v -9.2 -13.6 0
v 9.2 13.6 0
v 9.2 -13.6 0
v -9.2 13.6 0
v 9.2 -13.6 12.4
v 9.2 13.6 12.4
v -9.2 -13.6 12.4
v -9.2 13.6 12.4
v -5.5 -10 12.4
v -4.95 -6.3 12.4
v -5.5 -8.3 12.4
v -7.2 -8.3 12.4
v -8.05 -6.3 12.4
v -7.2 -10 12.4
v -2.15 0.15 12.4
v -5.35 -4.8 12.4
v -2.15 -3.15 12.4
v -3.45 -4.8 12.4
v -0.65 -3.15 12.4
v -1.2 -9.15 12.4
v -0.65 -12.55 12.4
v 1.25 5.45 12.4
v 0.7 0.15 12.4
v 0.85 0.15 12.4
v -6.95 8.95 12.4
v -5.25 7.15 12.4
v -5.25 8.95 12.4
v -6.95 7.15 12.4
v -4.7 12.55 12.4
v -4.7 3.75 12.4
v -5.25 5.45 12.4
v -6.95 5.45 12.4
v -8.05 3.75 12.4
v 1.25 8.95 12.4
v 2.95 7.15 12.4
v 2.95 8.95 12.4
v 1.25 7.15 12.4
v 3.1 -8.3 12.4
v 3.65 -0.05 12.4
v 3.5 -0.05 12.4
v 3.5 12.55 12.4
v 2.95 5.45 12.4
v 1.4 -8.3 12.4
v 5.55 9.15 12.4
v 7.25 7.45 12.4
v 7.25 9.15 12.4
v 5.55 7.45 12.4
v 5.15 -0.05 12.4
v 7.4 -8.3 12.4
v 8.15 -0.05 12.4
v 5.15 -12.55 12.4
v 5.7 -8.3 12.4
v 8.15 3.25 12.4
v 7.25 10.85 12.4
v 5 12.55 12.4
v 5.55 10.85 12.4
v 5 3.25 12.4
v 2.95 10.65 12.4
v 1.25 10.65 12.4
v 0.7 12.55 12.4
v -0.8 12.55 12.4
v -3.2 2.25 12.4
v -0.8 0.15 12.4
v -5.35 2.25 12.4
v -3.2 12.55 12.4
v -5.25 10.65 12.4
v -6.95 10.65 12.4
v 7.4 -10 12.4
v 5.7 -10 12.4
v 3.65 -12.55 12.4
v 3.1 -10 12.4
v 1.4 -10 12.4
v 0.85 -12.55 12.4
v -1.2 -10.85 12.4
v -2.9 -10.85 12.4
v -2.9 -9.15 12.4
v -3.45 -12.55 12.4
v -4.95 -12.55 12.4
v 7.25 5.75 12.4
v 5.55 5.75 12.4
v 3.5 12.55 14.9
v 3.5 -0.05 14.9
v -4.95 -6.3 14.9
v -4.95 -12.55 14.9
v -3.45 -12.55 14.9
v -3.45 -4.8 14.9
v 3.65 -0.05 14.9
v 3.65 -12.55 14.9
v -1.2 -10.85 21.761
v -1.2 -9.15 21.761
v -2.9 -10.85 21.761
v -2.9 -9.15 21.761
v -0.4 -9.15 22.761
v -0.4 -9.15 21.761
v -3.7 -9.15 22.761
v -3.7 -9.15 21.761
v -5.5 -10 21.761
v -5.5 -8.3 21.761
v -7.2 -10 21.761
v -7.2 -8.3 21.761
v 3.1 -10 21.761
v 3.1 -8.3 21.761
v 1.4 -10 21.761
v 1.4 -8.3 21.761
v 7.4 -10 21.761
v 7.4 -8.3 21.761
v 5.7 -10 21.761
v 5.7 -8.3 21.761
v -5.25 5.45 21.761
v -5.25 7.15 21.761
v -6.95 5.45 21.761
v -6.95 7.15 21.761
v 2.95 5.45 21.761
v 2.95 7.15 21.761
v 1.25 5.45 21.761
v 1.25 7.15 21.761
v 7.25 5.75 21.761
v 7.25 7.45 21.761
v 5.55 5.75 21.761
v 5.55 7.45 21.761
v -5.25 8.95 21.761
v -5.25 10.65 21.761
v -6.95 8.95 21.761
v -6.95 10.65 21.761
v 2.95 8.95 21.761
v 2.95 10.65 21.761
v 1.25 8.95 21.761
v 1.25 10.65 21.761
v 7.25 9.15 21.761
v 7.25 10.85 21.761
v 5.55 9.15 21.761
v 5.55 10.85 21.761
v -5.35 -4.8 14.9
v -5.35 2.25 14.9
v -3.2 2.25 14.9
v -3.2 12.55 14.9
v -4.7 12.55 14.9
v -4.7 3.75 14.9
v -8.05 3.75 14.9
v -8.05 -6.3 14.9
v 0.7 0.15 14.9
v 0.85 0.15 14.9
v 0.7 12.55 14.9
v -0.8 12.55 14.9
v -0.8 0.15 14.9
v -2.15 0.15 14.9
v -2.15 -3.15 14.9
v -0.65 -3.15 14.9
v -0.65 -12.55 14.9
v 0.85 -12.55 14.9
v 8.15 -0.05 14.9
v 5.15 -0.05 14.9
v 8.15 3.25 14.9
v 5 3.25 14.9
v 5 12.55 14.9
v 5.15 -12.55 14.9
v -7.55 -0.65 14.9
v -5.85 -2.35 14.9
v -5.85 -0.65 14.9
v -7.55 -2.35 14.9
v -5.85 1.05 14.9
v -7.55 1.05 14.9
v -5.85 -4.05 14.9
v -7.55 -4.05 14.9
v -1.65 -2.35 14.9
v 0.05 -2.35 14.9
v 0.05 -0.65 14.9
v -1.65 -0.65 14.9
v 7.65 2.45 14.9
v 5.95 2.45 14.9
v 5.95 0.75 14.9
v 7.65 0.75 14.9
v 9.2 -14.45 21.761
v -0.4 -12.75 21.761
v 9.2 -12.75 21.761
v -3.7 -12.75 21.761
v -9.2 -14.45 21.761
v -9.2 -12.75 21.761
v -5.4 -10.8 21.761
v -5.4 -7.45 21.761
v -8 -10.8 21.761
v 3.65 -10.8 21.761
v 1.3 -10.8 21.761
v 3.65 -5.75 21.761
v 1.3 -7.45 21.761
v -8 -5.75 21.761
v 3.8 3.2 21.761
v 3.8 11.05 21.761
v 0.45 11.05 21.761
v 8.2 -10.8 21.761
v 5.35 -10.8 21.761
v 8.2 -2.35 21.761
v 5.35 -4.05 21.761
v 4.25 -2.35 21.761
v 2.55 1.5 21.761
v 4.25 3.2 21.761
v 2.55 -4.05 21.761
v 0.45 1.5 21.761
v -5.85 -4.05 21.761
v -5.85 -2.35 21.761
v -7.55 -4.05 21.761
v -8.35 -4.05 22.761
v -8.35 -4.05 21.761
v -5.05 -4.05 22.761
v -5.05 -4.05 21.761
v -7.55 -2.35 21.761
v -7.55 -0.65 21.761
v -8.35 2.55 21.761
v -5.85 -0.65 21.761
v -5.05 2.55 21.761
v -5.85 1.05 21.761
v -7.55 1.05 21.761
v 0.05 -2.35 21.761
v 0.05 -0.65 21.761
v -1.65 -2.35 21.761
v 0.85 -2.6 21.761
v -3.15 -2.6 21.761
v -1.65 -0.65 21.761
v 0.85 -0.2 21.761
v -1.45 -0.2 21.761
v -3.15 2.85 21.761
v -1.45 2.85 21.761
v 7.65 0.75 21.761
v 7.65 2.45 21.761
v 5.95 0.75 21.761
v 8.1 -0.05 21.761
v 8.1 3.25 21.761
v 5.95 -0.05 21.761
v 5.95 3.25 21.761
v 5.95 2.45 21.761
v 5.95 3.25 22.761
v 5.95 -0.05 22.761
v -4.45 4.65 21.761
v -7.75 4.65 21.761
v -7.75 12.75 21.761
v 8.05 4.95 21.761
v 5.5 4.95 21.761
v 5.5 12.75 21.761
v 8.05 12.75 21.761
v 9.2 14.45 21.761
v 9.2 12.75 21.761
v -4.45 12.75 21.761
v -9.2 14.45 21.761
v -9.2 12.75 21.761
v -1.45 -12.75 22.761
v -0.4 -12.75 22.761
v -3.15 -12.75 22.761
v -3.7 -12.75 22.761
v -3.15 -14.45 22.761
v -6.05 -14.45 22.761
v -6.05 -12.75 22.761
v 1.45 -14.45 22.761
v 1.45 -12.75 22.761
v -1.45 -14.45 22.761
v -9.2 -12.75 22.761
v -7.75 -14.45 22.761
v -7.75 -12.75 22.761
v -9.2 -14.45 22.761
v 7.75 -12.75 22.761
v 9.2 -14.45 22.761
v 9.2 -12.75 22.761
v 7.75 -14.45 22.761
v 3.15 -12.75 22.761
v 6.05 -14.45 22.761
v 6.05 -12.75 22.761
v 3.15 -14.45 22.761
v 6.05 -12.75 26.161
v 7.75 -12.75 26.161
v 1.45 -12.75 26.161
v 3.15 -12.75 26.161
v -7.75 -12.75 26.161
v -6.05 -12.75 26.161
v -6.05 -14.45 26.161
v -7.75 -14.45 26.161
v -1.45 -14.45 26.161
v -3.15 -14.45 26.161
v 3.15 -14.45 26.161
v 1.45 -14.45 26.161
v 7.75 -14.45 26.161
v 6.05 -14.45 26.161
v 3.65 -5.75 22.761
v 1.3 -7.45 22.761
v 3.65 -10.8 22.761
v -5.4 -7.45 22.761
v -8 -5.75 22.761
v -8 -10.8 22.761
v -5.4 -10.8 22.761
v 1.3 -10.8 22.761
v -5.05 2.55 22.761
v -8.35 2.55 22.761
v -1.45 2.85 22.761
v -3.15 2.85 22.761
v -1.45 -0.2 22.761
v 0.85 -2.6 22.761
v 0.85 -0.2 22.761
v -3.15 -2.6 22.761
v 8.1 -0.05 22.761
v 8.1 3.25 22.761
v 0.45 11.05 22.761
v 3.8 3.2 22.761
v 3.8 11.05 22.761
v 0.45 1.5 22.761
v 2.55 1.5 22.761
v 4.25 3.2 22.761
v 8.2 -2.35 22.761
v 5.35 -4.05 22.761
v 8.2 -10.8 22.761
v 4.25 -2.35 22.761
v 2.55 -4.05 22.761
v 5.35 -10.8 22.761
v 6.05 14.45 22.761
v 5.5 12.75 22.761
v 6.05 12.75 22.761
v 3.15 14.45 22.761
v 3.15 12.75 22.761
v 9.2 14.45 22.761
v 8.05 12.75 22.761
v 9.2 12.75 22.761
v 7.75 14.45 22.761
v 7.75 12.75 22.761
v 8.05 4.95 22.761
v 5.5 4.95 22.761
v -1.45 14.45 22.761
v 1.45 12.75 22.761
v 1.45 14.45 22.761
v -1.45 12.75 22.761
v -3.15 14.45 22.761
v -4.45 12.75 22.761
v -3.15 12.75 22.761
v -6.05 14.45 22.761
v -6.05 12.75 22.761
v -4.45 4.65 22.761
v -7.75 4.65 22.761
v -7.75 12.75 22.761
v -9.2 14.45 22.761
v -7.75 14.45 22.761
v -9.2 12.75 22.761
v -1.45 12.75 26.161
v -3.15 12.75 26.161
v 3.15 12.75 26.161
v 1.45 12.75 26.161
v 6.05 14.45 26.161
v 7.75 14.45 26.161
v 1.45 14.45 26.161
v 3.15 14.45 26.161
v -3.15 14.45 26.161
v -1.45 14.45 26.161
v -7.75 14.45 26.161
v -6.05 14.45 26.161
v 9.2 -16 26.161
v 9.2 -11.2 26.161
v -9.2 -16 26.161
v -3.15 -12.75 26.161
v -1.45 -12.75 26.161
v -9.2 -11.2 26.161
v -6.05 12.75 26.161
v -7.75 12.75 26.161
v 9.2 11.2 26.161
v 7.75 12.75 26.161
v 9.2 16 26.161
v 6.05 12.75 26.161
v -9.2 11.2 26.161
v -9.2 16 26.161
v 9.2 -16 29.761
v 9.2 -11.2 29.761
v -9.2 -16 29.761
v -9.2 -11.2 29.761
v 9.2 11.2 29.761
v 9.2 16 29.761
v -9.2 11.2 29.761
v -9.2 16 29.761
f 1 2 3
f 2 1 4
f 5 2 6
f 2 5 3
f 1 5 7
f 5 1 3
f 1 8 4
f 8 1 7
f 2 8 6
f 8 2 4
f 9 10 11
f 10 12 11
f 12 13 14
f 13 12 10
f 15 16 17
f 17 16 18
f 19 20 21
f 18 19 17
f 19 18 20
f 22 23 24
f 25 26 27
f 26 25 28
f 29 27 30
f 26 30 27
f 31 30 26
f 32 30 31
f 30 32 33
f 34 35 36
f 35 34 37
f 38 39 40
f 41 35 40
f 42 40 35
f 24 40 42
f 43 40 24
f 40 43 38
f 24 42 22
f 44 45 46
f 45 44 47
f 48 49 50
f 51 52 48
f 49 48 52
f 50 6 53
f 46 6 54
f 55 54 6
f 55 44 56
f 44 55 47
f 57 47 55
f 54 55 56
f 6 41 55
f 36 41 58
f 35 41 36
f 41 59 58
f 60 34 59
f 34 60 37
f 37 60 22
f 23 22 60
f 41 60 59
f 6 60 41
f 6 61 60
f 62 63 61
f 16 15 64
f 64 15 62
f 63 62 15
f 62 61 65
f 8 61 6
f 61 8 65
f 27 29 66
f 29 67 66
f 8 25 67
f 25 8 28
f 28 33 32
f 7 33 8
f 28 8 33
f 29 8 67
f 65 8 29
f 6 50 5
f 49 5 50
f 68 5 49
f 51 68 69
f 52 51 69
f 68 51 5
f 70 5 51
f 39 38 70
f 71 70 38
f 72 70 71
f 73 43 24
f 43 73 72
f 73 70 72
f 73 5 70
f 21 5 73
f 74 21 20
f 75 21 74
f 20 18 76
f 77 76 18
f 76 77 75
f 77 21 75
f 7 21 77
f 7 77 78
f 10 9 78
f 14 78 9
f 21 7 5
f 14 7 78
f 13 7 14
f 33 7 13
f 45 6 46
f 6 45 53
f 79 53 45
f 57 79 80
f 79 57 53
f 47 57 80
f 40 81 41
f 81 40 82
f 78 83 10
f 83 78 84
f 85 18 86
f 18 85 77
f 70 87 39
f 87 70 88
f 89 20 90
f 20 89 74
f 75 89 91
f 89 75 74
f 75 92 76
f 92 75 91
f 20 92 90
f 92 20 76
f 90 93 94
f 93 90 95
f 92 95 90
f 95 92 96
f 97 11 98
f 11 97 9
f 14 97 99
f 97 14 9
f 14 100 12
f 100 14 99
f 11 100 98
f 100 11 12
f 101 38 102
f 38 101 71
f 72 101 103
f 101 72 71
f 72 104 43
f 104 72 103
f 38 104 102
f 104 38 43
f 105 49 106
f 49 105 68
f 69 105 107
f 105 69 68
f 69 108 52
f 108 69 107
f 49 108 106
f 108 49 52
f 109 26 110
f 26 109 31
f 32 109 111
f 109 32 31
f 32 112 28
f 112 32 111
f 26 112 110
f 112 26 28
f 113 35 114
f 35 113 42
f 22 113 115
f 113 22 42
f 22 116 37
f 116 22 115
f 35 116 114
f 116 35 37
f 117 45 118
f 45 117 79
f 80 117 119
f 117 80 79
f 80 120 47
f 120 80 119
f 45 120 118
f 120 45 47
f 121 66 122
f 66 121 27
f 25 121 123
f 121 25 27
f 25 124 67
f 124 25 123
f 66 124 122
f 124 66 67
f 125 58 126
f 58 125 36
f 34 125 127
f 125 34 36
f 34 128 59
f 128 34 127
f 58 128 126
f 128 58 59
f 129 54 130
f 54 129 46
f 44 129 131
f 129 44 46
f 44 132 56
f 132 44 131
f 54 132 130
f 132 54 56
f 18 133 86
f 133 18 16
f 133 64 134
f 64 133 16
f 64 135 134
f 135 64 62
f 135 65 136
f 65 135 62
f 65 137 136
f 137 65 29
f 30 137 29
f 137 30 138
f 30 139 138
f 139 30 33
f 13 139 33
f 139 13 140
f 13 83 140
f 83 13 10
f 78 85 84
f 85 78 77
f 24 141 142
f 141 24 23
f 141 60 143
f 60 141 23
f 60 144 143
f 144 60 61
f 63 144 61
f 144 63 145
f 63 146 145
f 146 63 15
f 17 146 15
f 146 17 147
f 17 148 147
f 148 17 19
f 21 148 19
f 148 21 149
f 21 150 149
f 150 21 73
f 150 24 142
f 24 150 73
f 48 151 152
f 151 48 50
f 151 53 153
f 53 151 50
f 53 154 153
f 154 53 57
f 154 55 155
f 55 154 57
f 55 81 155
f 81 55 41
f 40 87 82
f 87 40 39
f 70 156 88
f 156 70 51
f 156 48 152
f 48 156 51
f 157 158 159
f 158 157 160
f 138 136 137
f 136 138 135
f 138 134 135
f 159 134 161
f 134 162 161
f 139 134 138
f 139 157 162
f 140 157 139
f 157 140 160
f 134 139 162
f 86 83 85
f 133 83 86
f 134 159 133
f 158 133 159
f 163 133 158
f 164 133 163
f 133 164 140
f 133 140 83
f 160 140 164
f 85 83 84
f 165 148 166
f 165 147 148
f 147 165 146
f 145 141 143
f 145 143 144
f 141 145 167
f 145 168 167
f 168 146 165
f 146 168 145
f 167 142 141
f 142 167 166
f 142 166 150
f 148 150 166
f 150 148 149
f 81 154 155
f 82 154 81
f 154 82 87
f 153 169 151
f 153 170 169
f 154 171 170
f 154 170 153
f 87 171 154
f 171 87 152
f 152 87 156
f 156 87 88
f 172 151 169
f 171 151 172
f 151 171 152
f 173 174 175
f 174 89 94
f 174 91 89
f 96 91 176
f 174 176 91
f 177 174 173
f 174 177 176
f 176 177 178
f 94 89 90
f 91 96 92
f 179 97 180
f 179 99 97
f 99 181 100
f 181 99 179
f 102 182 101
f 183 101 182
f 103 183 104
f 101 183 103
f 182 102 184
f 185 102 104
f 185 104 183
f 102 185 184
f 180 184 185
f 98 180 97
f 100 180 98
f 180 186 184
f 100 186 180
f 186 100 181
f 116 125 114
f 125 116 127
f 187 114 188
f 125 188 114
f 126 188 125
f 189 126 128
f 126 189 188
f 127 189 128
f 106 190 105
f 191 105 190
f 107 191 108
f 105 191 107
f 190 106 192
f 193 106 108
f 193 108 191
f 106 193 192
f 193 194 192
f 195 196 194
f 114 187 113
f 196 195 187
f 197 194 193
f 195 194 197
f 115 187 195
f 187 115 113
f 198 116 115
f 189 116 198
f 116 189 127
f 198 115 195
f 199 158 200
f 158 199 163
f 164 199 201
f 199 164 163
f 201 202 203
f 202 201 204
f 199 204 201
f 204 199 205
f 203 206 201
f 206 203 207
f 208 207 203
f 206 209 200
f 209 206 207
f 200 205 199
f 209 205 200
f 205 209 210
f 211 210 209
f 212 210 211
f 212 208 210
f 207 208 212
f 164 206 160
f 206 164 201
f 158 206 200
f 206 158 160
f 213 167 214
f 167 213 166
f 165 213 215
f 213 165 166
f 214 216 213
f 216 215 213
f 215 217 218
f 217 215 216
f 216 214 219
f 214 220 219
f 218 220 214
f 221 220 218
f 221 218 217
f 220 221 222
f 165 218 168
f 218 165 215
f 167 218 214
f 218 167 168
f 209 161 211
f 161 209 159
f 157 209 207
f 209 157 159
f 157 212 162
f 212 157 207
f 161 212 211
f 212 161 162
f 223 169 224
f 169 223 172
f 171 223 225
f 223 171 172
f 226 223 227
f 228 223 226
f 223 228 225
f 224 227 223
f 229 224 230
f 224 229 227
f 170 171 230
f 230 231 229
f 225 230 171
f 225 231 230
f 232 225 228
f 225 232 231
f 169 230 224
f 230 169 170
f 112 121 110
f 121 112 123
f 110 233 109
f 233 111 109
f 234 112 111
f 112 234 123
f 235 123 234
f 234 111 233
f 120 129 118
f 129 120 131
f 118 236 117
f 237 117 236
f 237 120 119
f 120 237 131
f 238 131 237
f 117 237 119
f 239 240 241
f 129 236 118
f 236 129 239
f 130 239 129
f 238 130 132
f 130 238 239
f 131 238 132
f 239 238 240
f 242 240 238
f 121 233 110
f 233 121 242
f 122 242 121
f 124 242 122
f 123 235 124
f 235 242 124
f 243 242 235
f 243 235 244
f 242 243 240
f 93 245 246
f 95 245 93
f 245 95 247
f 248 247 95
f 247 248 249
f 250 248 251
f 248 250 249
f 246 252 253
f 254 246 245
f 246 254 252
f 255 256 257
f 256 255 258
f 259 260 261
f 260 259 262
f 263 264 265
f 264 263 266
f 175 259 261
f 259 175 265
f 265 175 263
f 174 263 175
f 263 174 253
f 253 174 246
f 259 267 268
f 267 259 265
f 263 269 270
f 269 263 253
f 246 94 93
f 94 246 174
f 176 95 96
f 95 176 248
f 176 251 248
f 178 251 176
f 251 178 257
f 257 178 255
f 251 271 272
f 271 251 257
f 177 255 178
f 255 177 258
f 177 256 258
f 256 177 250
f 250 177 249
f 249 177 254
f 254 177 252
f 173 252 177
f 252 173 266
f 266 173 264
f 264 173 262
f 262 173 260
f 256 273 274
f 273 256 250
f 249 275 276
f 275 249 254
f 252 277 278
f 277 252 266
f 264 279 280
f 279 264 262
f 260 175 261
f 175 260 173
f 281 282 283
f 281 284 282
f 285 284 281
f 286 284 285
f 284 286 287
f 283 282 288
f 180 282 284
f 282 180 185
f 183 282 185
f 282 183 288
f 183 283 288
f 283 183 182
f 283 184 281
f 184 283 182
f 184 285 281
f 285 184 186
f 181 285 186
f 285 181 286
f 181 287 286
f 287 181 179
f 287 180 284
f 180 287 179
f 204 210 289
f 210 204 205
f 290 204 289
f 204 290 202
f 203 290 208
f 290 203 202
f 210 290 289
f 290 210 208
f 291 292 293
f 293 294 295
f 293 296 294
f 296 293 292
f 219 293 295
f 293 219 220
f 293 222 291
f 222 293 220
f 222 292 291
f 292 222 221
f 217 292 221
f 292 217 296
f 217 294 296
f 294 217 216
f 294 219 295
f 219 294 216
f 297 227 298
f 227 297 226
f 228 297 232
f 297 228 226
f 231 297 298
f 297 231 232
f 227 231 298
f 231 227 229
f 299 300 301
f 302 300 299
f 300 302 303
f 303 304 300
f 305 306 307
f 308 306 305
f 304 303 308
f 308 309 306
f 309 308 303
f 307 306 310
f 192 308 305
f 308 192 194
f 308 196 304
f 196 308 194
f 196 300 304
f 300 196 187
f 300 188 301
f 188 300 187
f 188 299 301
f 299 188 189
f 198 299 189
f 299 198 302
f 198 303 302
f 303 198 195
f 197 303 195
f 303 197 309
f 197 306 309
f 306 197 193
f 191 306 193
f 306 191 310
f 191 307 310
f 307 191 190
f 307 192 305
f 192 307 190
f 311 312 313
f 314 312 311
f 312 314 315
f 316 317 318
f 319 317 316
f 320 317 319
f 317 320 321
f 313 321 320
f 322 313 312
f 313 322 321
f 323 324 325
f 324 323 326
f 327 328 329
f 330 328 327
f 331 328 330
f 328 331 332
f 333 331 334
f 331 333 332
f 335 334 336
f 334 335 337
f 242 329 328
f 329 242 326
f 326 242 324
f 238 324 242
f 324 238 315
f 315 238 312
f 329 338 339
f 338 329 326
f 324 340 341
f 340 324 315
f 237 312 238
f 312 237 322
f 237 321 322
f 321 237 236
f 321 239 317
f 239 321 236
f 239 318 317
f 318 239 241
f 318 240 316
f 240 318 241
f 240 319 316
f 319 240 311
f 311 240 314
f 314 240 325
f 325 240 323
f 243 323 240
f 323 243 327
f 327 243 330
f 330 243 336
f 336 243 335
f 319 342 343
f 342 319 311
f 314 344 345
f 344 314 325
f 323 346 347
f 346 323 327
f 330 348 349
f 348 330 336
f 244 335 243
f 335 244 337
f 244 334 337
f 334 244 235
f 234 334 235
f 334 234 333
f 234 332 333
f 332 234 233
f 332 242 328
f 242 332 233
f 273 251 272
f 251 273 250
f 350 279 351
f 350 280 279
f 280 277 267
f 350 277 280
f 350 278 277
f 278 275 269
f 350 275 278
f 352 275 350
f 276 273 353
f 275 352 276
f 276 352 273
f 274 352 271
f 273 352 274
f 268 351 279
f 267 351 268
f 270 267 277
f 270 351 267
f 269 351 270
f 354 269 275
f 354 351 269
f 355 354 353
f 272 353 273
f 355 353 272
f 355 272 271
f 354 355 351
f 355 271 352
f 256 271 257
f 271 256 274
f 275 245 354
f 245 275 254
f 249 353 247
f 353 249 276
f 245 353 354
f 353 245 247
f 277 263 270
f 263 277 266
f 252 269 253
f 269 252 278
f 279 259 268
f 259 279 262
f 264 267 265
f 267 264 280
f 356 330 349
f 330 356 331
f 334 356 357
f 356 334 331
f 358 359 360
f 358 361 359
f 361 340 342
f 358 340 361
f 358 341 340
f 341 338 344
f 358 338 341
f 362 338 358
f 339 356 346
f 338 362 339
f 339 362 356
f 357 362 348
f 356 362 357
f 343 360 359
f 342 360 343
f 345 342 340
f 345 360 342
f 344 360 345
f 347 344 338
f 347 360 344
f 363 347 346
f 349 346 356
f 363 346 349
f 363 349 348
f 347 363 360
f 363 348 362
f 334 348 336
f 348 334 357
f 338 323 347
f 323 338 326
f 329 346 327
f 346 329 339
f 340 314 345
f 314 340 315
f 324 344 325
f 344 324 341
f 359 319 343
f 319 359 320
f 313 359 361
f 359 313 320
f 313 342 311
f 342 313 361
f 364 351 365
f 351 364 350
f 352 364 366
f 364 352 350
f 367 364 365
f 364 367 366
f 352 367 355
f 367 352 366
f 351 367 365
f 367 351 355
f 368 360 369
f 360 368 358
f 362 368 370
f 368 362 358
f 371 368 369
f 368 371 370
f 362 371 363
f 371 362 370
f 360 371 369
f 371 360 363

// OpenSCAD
// Generated by SolidPython 0.4.2 on 2020-09-29 23:21:44
//!OpenSCAD

scale(v = 0.0100000000) {
	translate(v = [-920, -1360, 0]) {
		union() {
			color(c = [0.4000000000, 0.4000000000, 0.4000000000]) {
				translate(v = [0, 0, 0]) {
					linear_extrude(height = 1000.0000000000) {
						polygon(paths = [[0, 1, 2, 3]], points = [[0, 0], [0, 2720], [1840, 2720], [1840, 0]]);
					}
				}
			}
			color(c = [0.2000000000, 0.6000000000, 0.2000000000]) {
				translate(v = [0, 0, 1000.0000000000]) {
					linear_extrude(height = 120.0000000000) {
						polygon(paths = [[0, 1, 2, 3]], points = [[0, 1305], [0, 2720], [1840, 2720], [1840, 1305]]);
					}
				}
			}
			color(c = [0.4000000000, 0.4000000000, 0.4000000000]) {
				translate(v = [0, 0, 1000.0000000000]) {
					linear_extrude(height = 120.0000000000) {
						polygon(paths = [[0, 1, 2, 3]], points = [[0, 0], [0, 1305], [1840, 1305], [1840, 0]]);
					}
				}
			}
			color(c = [0.9000000000, 0.6000000000, 0.6000000000]) {
				translate(v = [0, 0, 1120.0000000000]) {
					linear_extrude(height = 120.0000000000) {
						polygon(paths = [[0, 1, 2, 3]], points = [[185, 1845], [185, 2485], [450, 2485], [450, 1845]]);
					}
				}
			}
			color(c = [0.9000000000, 0.6000000000, 0.6000000000]) {
				translate(v = [0, 0, 1120.0000000000]) {
					linear_extrude(height = 120.0000000000) {
						polygon(paths = [[0, 1, 2, 3]], points = [[600, 1845], [600, 2485], [840, 2485], [840, 1845]]);
					}
				}
			}
			color(c = [0.9000000000, 0.6000000000, 0.6000000000]) {
				translate(v = [0, 0, 1120.0000000000]) {
					linear_extrude(height = 120.0000000000) {
						polygon(paths = [[0, 1, 2, 3]], points = [[990, 1845], [990, 2485], [1270, 2485], [1270, 1845]]);
					}
				}
			}
			color(c = [0.9000000000, 0.6000000000, 0.6000000000]) {
				translate(v = [0, 0, 1120.0000000000]) {
					linear_extrude(height = 120.0000000000) {
						polygon(paths = [[0, 1, 2, 3]], points = [[1420, 1845], [1420, 2485], [1705, 2485], [1705, 1845]]);
					}
				}
			}
			color(c = [0.9000000000, 0.6000000000, 0.9000000000]) {
				translate(v = [0, 0, 1120.0000000000]) {
					linear_extrude(height = 120.0000000000) {
						polygon(paths = [[0, 1, 2, 3]], points = [[160, 235], [160, 655], [425, 655], [425, 235]]);
					}
				}
			}
			color(c = [0.9000000000, 0.6000000000, 0.9000000000]) {
				translate(v = [0, 0, 1120.0000000000]) {
					linear_extrude(height = 120.0000000000) {
						polygon(paths = [[0, 1, 2, 3]], points = [[575, 235], [575, 655], [855, 655], [855, 235]]);
					}
				}
			}
			color(c = [0.9000000000, 0.6000000000, 0.9000000000]) {
				translate(v = [0, 0, 1120.0000000000]) {
					linear_extrude(height = 120.0000000000) {
						polygon(paths = [[0, 1, 2, 3]], points = [[1005, 235], [1005, 655], [1285, 655], [1285, 235]]);
					}
				}
			}
			color(c = [0.9000000000, 0.6000000000, 0.9000000000]) {
				translate(v = [0, 0, 1120.0000000000]) {
					linear_extrude(height = 120.0000000000) {
						polygon(paths = [[0, 1, 2, 3]], points = [[1435, 235], [1435, 655], [1700, 655], [1700, 235]]);
					}
				}
			}
			color(c = [0.2000000000, 0.6000000000, 0.2000000000]) {
				translate(v = [0, 0, 1120.0000000000]) {
					linear_extrude(height = 120.0000000000) {
						difference() {
							polygon(paths = [[0, 1, 2, 3]], points = [[0, 1305], [0, 2720], [1840, 2720], [1840, 1305]]);
							polygon(paths = [[0, 1, 2, 3]], points = [[185, 1845], [450, 1845], [450, 2485], [185, 2485]]);
							polygon(paths = [[0, 1, 2, 3]], points = [[600, 1845], [840, 1845], [840, 2485], [600, 2485]]);
							polygon(paths = [[0, 1, 2, 3]], points = [[990, 1845], [1270, 1845], [1270, 2485], [990, 2485]]);
							polygon(paths = [[0, 1, 2, 3]], points = [[1420, 1845], [1705, 1845], [1705, 2485], [1420, 2485]]);
						}
					}
				}
			}
			color(c = [0.4000000000, 0.4000000000, 0.4000000000]) {
				translate(v = [0, 0, 1120.0000000000]) {
					linear_extrude(height = 120.0000000000) {
						difference() {
							polygon(paths = [[0, 1, 2, 3]], points = [[0, 0], [0, 1305], [1840, 1305], [1840, 0]]);
							polygon(paths = [[0, 1, 2, 3]], points = [[160, 235], [425, 235], [425, 655], [160, 655]]);
							polygon(paths = [[0, 1, 2, 3]], points = [[575, 235], [855, 235], [855, 655], [575, 655]]);
							polygon(paths = [[0, 1, 2, 3]], points = [[1005, 235], [1285, 235], [1285, 655], [1005, 655]]);
							polygon(paths = [[0, 1, 2, 3]], points = [[1435, 235], [1700, 235], [1700, 655], [1435, 655]]);
						}
					}
				}
			}
			color(c = [0.1000000000, 0.1000000000, 0.1000000000]) {
				translate(v = [0, 0, 1240.0000000000]) {
					linear_extrude(height = 70.0000000000) {
						polygon(paths = [[0, 1, 2, 3]], points = [[630, 275], [630, 445], [800, 445], [800, 275]]);
					}
				}
			}
			color(c = [0.1000000000, 0.1000000000, 0.1000000000]) {
				translate(v = [0, 0, 1240.0000000000]) {
					linear_extrude(height = 70.0000000000) {
						polygon(paths = [[0, 1, 2, 3]], points = [[200, 360], [200, 530], [370, 530], [370, 360]]);
					}
				}
			}
			color(c = [0.1000000000, 0.1000000000, 0.1000000000]) {
				translate(v = [0, 0, 1240.0000000000]) {
					linear_extrude(height = 70.0000000000) {
						polygon(paths = [[0, 1, 2, 3]], points = [[1060, 360], [1060, 530], [1230, 530], [1230, 360]]);
					}
				}
			}
			color(c = [0.1000000000, 0.1000000000, 0.1000000000]) {
				translate(v = [0, 0, 1240.0000000000]) {
					linear_extrude(height = 70.0000000000) {
						polygon(paths = [[0, 1, 2, 3]], points = [[1490, 360], [1490, 530], [1660, 530], [1660, 360]]);
					}
				}
			}
			color(c = [0.1000000000, 0.1000000000, 0.1000000000]) {
				translate(v = [0, 0, 1240.0000000000]) {
					linear_extrude(height = 70.0000000000) {
						polygon(paths = [[0, 1, 2, 3]], points = [[225, 1905], [225, 2075], [395, 2075], [395, 1905]]);
					}
				}
			}
			color(c = [0.1000000000, 0.1000000000, 0.1000000000]) {
				translate(v = [0, 0, 1240.0000000000]) {
					linear_extrude(height = 70.0000000000) {
						polygon(paths = [[0, 1, 2, 3]], points = [[1045, 1905], [1045, 2075], [1215, 2075], [1215, 1905]]);
					}
				}
			}
			color(c = [0.1000000000, 0.1000000000, 0.1000000000]) {
				translate(v = [0, 0, 1240.0000000000]) {
					linear_extrude(height = 70.0000000000) {
						polygon(paths = [[0, 1, 2, 3]], points = [[1475, 1935], [1475, 2105], [1645, 2105], [1645, 1935]]);
					}
				}
			}
			color(c = [0.1000000000, 0.1000000000, 0.1000000000]) {
				translate(v = [0, 0, 1240.0000000000]) {
					linear_extrude(height = 70.0000000000) {
						polygon(paths = [[0, 1, 2, 3]], points = [[225, 2255], [225, 2425], [395, 2425], [395, 2255]]);
					}
				}
			}
			color(c = [0.1000000000, 0.1000000000, 0.1000000000]) {
				translate(v = [0, 0, 1240.0000000000]) {
					linear_extrude(height = 70.0000000000) {
						polygon(paths = [[0, 1, 2, 3]], points = [[1045, 2255], [1045, 2425], [1215, 2425], [1215, 2255]]);
					}
				}
			}
			color(c = [0.1000000000, 0.1000000000, 0.1000000000]) {
				translate(v = [0, 0, 1240.0000000000]) {
					linear_extrude(height = 70.0000000000) {
						polygon(paths = [[0, 1, 2, 3]], points = [[1475, 2275], [1475, 2445], [1645, 2445], [1645, 2275]]);
					}
				}
			}
			color(c = [1.0000000000, 1.0000000000, 1.0000000000]) {
				translate(v = [0, 0, 1240.0000000000]) {
					linear_extrude(height = 70.0000000000) {
						polygon(paths = [[0, 1, 2, 3, 4, 5, 6, 7, 8, 9, 10, 11]], points = [[425, 105], [425, 730], [115, 730], [115, 1735], [450, 1735], [450, 2615], [600, 2615], [600, 1585], [385, 1585], [385, 880], [575, 880], [575, 105]]);
					}
				}
			}
			color(c = [1.0000000000, 1.0000000000, 1.0000000000]) {
				translate(v = [0, 0, 1240.0000000000]) {
					linear_extrude(height = 70.0000000000) {
						polygon(paths = [[0, 1, 2, 3, 4, 5, 6, 7, 8, 9]], points = [[855, 105], [855, 1045], [705, 1045], [705, 1375], [840, 1375], [840, 2615], [990, 2615], [990, 1375], [1005, 1375], [1005, 105]]);
					}
				}
			}
			color(c = [1.0000000000, 1.0000000000, 1.0000000000]) {
				translate(v = [0, 0, 1240.0000000000]) {
					linear_extrude(height = 70.0000000000) {
						polygon(paths = [[0, 1, 2, 3, 4, 5, 6, 7, 8, 9]], points = [[1285, 105], [1285, 1355], [1270, 1355], [1270, 2615], [1420, 2615], [1420, 1685], [1735, 1685], [1735, 1355], [1435, 1355], [1435, 105]]);
					}
				}
			}
			color(c = [0.1000000000, 0.1000000000, 0.1000000000]) {
				translate(v = [0, 0, 1310.0000000000]) {
					linear_extrude(height = 180.0000000000) {
						polygon(paths = [[0, 1, 2, 3]], points = [[630, 275], [630, 445], [800, 445], [800, 275]]);
					}
				}
			}
			color(c = [0.1000000000, 0.1000000000, 0.1000000000]) {
				translate(v = [0, 0, 1310.0000000000]) {
					linear_extrude(height = 180.0000000000) {
						polygon(paths = [[0, 1, 2, 3]], points = [[200, 360], [200, 530], [370, 530], [370, 360]]);
					}
				}
			}
			color(c = [0.1000000000, 0.1000000000, 0.1000000000]) {
				translate(v = [0, 0, 1310.0000000000]) {
					linear_extrude(height = 180.0000000000) {
						polygon(paths = [[0, 1, 2, 3]], points = [[1060, 360], [1060, 530], [1230, 530], [1230, 360]]);
					}
				}
			}
			color(c = [0.1000000000, 0.1000000000, 0.1000000000]) {
				translate(v = [0, 0, 1310.0000000000]) {
					linear_extrude(height = 180.0000000000) {
						polygon(paths = [[0, 1, 2, 3]], points = [[1490, 360], [1490, 530], [1660, 530], [1660, 360]]);
					}
				}
			}
			color(c = [0.1000000000, 0.1000000000, 0.1000000000]) {
				translate(v = [0, 0, 1310.0000000000]) {
					linear_extrude(height = 180.0000000000) {
						polygon(paths = [[0, 1, 2, 3]], points = [[225, 1905], [225, 2075], [395, 2075], [395, 1905]]);
					}
				}
			}
			color(c = [0.1000000000, 0.1000000000, 0.1000000000]) {
				translate(v = [0, 0, 1310.0000000000]) {
					linear_extrude(height = 180.0000000000) {
						polygon(paths = [[0, 1, 2, 3]], points = [[1045, 1905], [1045, 2075], [1215, 2075], [1215, 1905]]);
					}
				}
			}
			color(c = [0.1000000000, 0.1000000000, 0.1000000000]) {
				translate(v = [0, 0, 1310.0000000000]) {
					linear_extrude(height = 180.0000000000) {
						polygon(paths = [[0, 1, 2, 3]], points = [[1475, 1935], [1475, 2105], [1645, 2105], [1645, 1935]]);
					}
				}
			}
			color(c = [0.1000000000, 0.1000000000, 0.1000000000]) {
				translate(v = [0, 0, 1310.0000000000]) {
					linear_extrude(height = 180.0000000000) {
						polygon(paths = [[0, 1, 2, 3]], points = [[225, 2255], [225, 2425], [395, 2425], [395, 2255]]);
					}
				}
			}
			color(c = [0.1000000000, 0.1000000000, 0.1000000000]) {
				translate(v = [0, 0, 1310.0000000000]) {
					linear_extrude(height = 180.0000000000) {
						polygon(paths = [[0, 1, 2, 3]], points = [[1045, 2255], [1045, 2425], [1215, 2425], [1215, 2255]]);
					}
				}
			}
			color(c = [0.1000000000, 0.1000000000, 0.1000000000]) {
				translate(v = [0, 0, 1310.0000000000]) {
					linear_extrude(height = 180.0000000000) {
						polygon(paths = [[0, 1, 2, 3]], points = [[1475, 2275], [1475, 2445], [1645, 2445], [1645, 2275]]);
					}
				}
			}
			color(c = [0.7000000000, 0, 0]) {
				translate(v = [0, 0, 1310.0000000000]) {
					linear_extrude(height = 180.0000000000) {
						polygon(paths = [[0, 1, 2, 3, 4, 5, 6, 7, 8, 9, 10, 11]], points = [[425, 105], [425, 730], [115, 730], [115, 1735], [450, 1735], [450, 2615], [600, 2615], [600, 1585], [385, 1585], [385, 880], [575, 880], [575, 105]]);
					}
				}
			}
			color(c = [0.7000000000, 0, 0]) {
				translate(v = [0, 0, 1310.0000000000]) {
					linear_extrude(height = 180.0000000000) {
						polygon(paths = [[0, 1, 2, 3, 4, 5, 6, 7, 8, 9]], points = [[855, 105], [855, 1045], [705, 1045], [705, 1375], [840, 1375], [840, 2615], [990, 2615], [990, 1375], [1005, 1375], [1005, 105]]);
					}
				}
			}
			color(c = [0.7000000000, 0, 0]) {
				translate(v = [0, 0, 1310.0000000000]) {
					linear_extrude(height = 180.0000000000) {
						polygon(paths = [[0, 1, 2, 3, 4, 5, 6, 7, 8, 9]], points = [[1285, 105], [1285, 1355], [1270, 1355], [1270, 2615], [1420, 2615], [1420, 1685], [1735, 1685], [1735, 1355], [1435, 1355], [1435, 105]]);
					}
				}
			}
			color(c = [0.1000000000, 0.1000000000, 0.1000000000]) {
				translate(v = [0, 0, 1490.0000000000]) {
					linear_extrude(height = 686.1000000000) {
						polygon(paths = [[0, 1, 2, 3]], points = [[630, 275], [630, 445], [800, 445], [800, 275]]);
					}
				}
			}
			color(c = [0.1000000000, 0.1000000000, 0.1000000000]) {
				translate(v = [0, 0, 1490.0000000000]) {
					linear_extrude(height = 686.1000000000) {
						polygon(paths = [[0, 1, 2, 3]], points = [[200, 360], [200, 530], [370, 530], [370, 360]]);
					}
				}
			}
			color(c = [0.1000000000, 0.1000000000, 0.1000000000]) {
				translate(v = [0, 0, 1490.0000000000]) {
					linear_extrude(height = 686.1000000000) {
						polygon(paths = [[0, 1, 2, 3]], points = [[1060, 360], [1060, 530], [1230, 530], [1230, 360]]);
					}
				}
			}
			color(c = [0.1000000000, 0.1000000000, 0.1000000000]) {
				translate(v = [0, 0, 1490.0000000000]) {
					linear_extrude(height = 686.1000000000) {
						polygon(paths = [[0, 1, 2, 3]], points = [[1490, 360], [1490, 530], [1660, 530], [1660, 360]]);
					}
				}
			}
			color(c = [0.1000000000, 0.1000000000, 0.1000000000]) {
				translate(v = [0, 0, 1490.0000000000]) {
					linear_extrude(height = 686.1000000000) {
						polygon(paths = [[0, 1, 2, 3]], points = [[165, 955], [165, 1125], [335, 1125], [335, 955]]);
					}
				}
			}
			color(c = [0.1000000000, 0.1000000000, 0.1000000000]) {
				translate(v = [0, 0, 1490.0000000000]) {
					linear_extrude(height = 686.1000000000) {
						polygon(paths = [[0, 1, 2, 3]], points = [[755, 1125], [755, 1295], [925, 1295], [925, 1125]]);
					}
				}
			}
			color(c = [0.1000000000, 0.1000000000, 0.1000000000]) {
				translate(v = [0, 0, 1490.0000000000]) {
					linear_extrude(height = 686.1000000000) {
						polygon(paths = [[0, 1, 2, 3]], points = [[165, 1295], [165, 1465], [335, 1465], [335, 1295]]);
					}
				}
			}
			color(c = [0.1000000000, 0.1000000000, 0.1000000000]) {
				translate(v = [0, 0, 1490.0000000000]) {
					linear_extrude(height = 686.1000000000) {
						polygon(paths = [[0, 1, 2, 3]], points = [[1515, 1435], [1515, 1605], [1685, 1605], [1685, 1435]]);
					}
				}
			}
			color(c = [0.1000000000, 0.1000000000, 0.1000000000]) {
				translate(v = [0, 0, 1490.0000000000]) {
					linear_extrude(height = 686.1000000000) {
						polygon(paths = [[0, 1, 2, 3]], points = [[225, 1905], [225, 2075], [395, 2075], [395, 1905]]);
					}
				}
			}
			color(c = [0.1000000000, 0.1000000000, 0.1000000000]) {
				translate(v = [0, 0, 1490.0000000000]) {
					linear_extrude(height = 686.1000000000) {
						polygon(paths = [[0, 1, 2, 3]], points = [[1045, 1905], [1045, 2075], [1215, 2075], [1215, 1905]]);
					}
				}
			}
			color(c = [0.1000000000, 0.1000000000, 0.1000000000]) {
				translate(v = [0, 0, 1490.0000000000]) {
					linear_extrude(height = 686.1000000000) {
						polygon(paths = [[0, 1, 2, 3]], points = [[1475, 1935], [1475, 2105], [1645, 2105], [1645, 1935]]);
					}
				}
			}
			color(c = [0.1000000000, 0.1000000000, 0.1000000000]) {
				translate(v = [0, 0, 1490.0000000000]) {
					linear_extrude(height = 686.1000000000) {
						polygon(paths = [[0, 1, 2, 3]], points = [[225, 2255], [225, 2425], [395, 2425], [395, 2255]]);
					}
				}
			}
			color(c = [0.1000000000, 0.1000000000, 0.1000000000]) {
				translate(v = [0, 0, 1490.0000000000]) {
					linear_extrude(height = 686.1000000000) {
						polygon(paths = [[0, 1, 2, 3]], points = [[1045, 2255], [1045, 2425], [1215, 2425], [1215, 2255]]);
					}
				}
			}
			color(c = [0.1000000000, 0.1000000000, 0.1000000000]) {
				translate(v = [0, 0, 1490.0000000000]) {
					linear_extrude(height = 686.1000000000) {
						polygon(paths = [[0, 1, 2, 3]], points = [[1475, 2275], [1475, 2445], [1645, 2445], [1645, 2275]]);
					}
				}
			}
			color(c = [0.9000000000, 0.6000000000, 0.6000000000]) {
				translate(v = [0, 0, 2176.1000000000]) {
					linear_extrude(height = 100.0000000000) {
						polygon(paths = [[0, 1, 2, 3, 4, 5, 6, 7]], points = [[0, -85], [0, 85], [550, 85], [550, 445], [880, 445], [880, 85], [1840, 85], [1840, -85]]);
					}
				}
			}
			color(c = [0.9000000000, 0.6000000000, 0.6000000000]) {
				translate(v = [0, 0, 2176.1000000000]) {
					linear_extrude(height = 100.0000000000) {
						polygon(paths = [[0, 1, 2, 3, 4, 5, 6, 7]], points = [[120, 280], [120, 785], [1285, 785], [1285, 280], [1050, 280], [1050, 615], [380, 615], [380, 280]]);
					}
				}
			}
			color(c = [0.9000000000, 0.6000000000, 0.6000000000]) {
				translate(v = [0, 0, 2176.1000000000]) {
					linear_extrude(height = 100.0000000000) {
						polygon(paths = [[0, 1, 2, 3]], points = [[85, 955], [85, 1615], [415, 1615], [415, 955]]);
					}
				}
			}
			color(c = [0.9000000000, 0.6000000000, 0.6000000000]) {
				translate(v = [0, 0, 2176.1000000000]) {
					linear_extrude(height = 100.0000000000) {
						polygon(paths = [[0, 1, 2, 3, 4, 5]], points = [[605, 1100], [605, 1645], [775, 1645], [775, 1340], [1005, 1340], [1005, 1100]]);
					}
				}
			}
			color(c = [0.9000000000, 0.6000000000, 0.6000000000]) {
				translate(v = [0, 0, 2176.1000000000]) {
					linear_extrude(height = 100.0000000000) {
						polygon(paths = [[0, 1, 2, 3]], points = [[1515, 1355], [1515, 1685], [1730, 1685], [1730, 1355]]);
					}
				}
			}
			color(c = [0.9000000000, 0.6000000000, 0.6000000000]) {
				translate(v = [0, 0, 2176.1000000000]) {
					linear_extrude(height = 100.0000000000) {
						polygon(paths = [[0, 1, 2, 3, 4, 5, 6, 7, 8, 9, 10, 11]], points = [[1455, 280], [1455, 955], [1175, 955], [1175, 1510], [965, 1510], [965, 2465], [1300, 2465], [1300, 1680], [1345, 1680], [1345, 1125], [1740, 1125], [1740, 280]]);
					}
				}
			}
			color(c = [0.9000000000, 0.6000000000, 0.6000000000]) {
				translate(v = [0, 0, 2176.1000000000]) {
					linear_extrude(height = 100.0000000000) {
						polygon(paths = [[0, 1, 2, 3, 4, 5, 6, 7, 8, 9, 10, 11]], points = [[145, 1825], [145, 2635], [0, 2635], [0, 2805], [1840, 2805], [1840, 2635], [1725, 2635], [1725, 1855], [1470, 1855], [1470, 2635], [475, 2635], [475, 1825]]);
					}
				}
			}
			color(c = [0.5000000000, 0.5000000000, 0.5000000000]) {
				translate(v = [0, 0, 2276.1000000000]) {
					linear_extrude(height = 340.0000000000) {
						polygon(paths = [[0, 1, 2, 3]], points = [[145, -85], [145, 85], [315, 85], [315, -85]]);
					}
				}
			}
			color(c = [0.5000000000, 0.5000000000, 0.5000000000]) {
				translate(v = [0, 0, 2276.1000000000]) {
					linear_extrude(height = 340.0000000000) {
						polygon(paths = [[0, 1, 2, 3]], points = [[605, -85], [605, 85], [775, 85], [775, -85]]);
					}
				}
			}
			color(c = [0.5000000000, 0.5000000000, 0.5000000000]) {
				translate(v = [0, 0, 2276.1000000000]) {
					linear_extrude(height = 340.0000000000) {
						polygon(paths = [[0, 1, 2, 3]], points = [[1065, -85], [1065, 85], [1235, 85], [1235, -85]]);
					}
				}
			}
			color(c = [0.5000000000, 0.5000000000, 0.5000000000]) {
				translate(v = [0, 0, 2276.1000000000]) {
					linear_extrude(height = 340.0000000000) {
						polygon(paths = [[0, 1, 2, 3]], points = [[1525, -85], [1525, 85], [1695, 85], [1695, -85]]);
					}
				}
			}
			color(c = [0.5000000000, 0.5000000000, 0.5000000000]) {
				translate(v = [0, 0, 2276.1000000000]) {
					linear_extrude(height = 340.0000000000) {
						polygon(paths = [[0, 1, 2, 3]], points = [[145, 2635], [145, 2805], [315, 2805], [315, 2635]]);
					}
				}
			}
			color(c = [0.5000000000, 0.5000000000, 0.5000000000]) {
				translate(v = [0, 0, 2276.1000000000]) {
					linear_extrude(height = 340.0000000000) {
						polygon(paths = [[0, 1, 2, 3]], points = [[605, 2635], [605, 2805], [775, 2805], [775, 2635]]);
					}
				}
			}
			color(c = [0.5000000000, 0.5000000000, 0.5000000000]) {
				translate(v = [0, 0, 2276.1000000000]) {
					linear_extrude(height = 340.0000000000) {
						polygon(paths = [[0, 1, 2, 3]], points = [[1065, 2635], [1065, 2805], [1235, 2805], [1235, 2635]]);
					}
				}
			}
			color(c = [0.5000000000, 0.5000000000, 0.5000000000]) {
				translate(v = [0, 0, 2276.1000000000]) {
					linear_extrude(height = 340.0000000000) {
						polygon(paths = [[0, 1, 2, 3]], points = [[1525, 2635], [1525, 2805], [1695, 2805], [1695, 2635]]);
					}
				}
			}
			color(c = [0.3000000000, 0.3000000000, 1]) {
				translate(v = [0, 0, 2616.1000000000]) {
					linear_extrude(height = 360.0000000000) {
						polygon(paths = [[0, 1, 2, 3]], points = [[0, -240], [0, 240], [1840, 240], [1840, -240]]);
					}
				}
			}
			color(c = [0.3000000000, 0.3000000000, 1]) {
				translate(v = [0, 0, 2616.1000000000]) {
					linear_extrude(height = 360.0000000000) {
						polygon(paths = [[0, 1, 2, 3]], points = [[0, 2480], [0, 2960], [1840, 2960], [1840, 2480]]);
					}
				}
			}
		}
	}
}
